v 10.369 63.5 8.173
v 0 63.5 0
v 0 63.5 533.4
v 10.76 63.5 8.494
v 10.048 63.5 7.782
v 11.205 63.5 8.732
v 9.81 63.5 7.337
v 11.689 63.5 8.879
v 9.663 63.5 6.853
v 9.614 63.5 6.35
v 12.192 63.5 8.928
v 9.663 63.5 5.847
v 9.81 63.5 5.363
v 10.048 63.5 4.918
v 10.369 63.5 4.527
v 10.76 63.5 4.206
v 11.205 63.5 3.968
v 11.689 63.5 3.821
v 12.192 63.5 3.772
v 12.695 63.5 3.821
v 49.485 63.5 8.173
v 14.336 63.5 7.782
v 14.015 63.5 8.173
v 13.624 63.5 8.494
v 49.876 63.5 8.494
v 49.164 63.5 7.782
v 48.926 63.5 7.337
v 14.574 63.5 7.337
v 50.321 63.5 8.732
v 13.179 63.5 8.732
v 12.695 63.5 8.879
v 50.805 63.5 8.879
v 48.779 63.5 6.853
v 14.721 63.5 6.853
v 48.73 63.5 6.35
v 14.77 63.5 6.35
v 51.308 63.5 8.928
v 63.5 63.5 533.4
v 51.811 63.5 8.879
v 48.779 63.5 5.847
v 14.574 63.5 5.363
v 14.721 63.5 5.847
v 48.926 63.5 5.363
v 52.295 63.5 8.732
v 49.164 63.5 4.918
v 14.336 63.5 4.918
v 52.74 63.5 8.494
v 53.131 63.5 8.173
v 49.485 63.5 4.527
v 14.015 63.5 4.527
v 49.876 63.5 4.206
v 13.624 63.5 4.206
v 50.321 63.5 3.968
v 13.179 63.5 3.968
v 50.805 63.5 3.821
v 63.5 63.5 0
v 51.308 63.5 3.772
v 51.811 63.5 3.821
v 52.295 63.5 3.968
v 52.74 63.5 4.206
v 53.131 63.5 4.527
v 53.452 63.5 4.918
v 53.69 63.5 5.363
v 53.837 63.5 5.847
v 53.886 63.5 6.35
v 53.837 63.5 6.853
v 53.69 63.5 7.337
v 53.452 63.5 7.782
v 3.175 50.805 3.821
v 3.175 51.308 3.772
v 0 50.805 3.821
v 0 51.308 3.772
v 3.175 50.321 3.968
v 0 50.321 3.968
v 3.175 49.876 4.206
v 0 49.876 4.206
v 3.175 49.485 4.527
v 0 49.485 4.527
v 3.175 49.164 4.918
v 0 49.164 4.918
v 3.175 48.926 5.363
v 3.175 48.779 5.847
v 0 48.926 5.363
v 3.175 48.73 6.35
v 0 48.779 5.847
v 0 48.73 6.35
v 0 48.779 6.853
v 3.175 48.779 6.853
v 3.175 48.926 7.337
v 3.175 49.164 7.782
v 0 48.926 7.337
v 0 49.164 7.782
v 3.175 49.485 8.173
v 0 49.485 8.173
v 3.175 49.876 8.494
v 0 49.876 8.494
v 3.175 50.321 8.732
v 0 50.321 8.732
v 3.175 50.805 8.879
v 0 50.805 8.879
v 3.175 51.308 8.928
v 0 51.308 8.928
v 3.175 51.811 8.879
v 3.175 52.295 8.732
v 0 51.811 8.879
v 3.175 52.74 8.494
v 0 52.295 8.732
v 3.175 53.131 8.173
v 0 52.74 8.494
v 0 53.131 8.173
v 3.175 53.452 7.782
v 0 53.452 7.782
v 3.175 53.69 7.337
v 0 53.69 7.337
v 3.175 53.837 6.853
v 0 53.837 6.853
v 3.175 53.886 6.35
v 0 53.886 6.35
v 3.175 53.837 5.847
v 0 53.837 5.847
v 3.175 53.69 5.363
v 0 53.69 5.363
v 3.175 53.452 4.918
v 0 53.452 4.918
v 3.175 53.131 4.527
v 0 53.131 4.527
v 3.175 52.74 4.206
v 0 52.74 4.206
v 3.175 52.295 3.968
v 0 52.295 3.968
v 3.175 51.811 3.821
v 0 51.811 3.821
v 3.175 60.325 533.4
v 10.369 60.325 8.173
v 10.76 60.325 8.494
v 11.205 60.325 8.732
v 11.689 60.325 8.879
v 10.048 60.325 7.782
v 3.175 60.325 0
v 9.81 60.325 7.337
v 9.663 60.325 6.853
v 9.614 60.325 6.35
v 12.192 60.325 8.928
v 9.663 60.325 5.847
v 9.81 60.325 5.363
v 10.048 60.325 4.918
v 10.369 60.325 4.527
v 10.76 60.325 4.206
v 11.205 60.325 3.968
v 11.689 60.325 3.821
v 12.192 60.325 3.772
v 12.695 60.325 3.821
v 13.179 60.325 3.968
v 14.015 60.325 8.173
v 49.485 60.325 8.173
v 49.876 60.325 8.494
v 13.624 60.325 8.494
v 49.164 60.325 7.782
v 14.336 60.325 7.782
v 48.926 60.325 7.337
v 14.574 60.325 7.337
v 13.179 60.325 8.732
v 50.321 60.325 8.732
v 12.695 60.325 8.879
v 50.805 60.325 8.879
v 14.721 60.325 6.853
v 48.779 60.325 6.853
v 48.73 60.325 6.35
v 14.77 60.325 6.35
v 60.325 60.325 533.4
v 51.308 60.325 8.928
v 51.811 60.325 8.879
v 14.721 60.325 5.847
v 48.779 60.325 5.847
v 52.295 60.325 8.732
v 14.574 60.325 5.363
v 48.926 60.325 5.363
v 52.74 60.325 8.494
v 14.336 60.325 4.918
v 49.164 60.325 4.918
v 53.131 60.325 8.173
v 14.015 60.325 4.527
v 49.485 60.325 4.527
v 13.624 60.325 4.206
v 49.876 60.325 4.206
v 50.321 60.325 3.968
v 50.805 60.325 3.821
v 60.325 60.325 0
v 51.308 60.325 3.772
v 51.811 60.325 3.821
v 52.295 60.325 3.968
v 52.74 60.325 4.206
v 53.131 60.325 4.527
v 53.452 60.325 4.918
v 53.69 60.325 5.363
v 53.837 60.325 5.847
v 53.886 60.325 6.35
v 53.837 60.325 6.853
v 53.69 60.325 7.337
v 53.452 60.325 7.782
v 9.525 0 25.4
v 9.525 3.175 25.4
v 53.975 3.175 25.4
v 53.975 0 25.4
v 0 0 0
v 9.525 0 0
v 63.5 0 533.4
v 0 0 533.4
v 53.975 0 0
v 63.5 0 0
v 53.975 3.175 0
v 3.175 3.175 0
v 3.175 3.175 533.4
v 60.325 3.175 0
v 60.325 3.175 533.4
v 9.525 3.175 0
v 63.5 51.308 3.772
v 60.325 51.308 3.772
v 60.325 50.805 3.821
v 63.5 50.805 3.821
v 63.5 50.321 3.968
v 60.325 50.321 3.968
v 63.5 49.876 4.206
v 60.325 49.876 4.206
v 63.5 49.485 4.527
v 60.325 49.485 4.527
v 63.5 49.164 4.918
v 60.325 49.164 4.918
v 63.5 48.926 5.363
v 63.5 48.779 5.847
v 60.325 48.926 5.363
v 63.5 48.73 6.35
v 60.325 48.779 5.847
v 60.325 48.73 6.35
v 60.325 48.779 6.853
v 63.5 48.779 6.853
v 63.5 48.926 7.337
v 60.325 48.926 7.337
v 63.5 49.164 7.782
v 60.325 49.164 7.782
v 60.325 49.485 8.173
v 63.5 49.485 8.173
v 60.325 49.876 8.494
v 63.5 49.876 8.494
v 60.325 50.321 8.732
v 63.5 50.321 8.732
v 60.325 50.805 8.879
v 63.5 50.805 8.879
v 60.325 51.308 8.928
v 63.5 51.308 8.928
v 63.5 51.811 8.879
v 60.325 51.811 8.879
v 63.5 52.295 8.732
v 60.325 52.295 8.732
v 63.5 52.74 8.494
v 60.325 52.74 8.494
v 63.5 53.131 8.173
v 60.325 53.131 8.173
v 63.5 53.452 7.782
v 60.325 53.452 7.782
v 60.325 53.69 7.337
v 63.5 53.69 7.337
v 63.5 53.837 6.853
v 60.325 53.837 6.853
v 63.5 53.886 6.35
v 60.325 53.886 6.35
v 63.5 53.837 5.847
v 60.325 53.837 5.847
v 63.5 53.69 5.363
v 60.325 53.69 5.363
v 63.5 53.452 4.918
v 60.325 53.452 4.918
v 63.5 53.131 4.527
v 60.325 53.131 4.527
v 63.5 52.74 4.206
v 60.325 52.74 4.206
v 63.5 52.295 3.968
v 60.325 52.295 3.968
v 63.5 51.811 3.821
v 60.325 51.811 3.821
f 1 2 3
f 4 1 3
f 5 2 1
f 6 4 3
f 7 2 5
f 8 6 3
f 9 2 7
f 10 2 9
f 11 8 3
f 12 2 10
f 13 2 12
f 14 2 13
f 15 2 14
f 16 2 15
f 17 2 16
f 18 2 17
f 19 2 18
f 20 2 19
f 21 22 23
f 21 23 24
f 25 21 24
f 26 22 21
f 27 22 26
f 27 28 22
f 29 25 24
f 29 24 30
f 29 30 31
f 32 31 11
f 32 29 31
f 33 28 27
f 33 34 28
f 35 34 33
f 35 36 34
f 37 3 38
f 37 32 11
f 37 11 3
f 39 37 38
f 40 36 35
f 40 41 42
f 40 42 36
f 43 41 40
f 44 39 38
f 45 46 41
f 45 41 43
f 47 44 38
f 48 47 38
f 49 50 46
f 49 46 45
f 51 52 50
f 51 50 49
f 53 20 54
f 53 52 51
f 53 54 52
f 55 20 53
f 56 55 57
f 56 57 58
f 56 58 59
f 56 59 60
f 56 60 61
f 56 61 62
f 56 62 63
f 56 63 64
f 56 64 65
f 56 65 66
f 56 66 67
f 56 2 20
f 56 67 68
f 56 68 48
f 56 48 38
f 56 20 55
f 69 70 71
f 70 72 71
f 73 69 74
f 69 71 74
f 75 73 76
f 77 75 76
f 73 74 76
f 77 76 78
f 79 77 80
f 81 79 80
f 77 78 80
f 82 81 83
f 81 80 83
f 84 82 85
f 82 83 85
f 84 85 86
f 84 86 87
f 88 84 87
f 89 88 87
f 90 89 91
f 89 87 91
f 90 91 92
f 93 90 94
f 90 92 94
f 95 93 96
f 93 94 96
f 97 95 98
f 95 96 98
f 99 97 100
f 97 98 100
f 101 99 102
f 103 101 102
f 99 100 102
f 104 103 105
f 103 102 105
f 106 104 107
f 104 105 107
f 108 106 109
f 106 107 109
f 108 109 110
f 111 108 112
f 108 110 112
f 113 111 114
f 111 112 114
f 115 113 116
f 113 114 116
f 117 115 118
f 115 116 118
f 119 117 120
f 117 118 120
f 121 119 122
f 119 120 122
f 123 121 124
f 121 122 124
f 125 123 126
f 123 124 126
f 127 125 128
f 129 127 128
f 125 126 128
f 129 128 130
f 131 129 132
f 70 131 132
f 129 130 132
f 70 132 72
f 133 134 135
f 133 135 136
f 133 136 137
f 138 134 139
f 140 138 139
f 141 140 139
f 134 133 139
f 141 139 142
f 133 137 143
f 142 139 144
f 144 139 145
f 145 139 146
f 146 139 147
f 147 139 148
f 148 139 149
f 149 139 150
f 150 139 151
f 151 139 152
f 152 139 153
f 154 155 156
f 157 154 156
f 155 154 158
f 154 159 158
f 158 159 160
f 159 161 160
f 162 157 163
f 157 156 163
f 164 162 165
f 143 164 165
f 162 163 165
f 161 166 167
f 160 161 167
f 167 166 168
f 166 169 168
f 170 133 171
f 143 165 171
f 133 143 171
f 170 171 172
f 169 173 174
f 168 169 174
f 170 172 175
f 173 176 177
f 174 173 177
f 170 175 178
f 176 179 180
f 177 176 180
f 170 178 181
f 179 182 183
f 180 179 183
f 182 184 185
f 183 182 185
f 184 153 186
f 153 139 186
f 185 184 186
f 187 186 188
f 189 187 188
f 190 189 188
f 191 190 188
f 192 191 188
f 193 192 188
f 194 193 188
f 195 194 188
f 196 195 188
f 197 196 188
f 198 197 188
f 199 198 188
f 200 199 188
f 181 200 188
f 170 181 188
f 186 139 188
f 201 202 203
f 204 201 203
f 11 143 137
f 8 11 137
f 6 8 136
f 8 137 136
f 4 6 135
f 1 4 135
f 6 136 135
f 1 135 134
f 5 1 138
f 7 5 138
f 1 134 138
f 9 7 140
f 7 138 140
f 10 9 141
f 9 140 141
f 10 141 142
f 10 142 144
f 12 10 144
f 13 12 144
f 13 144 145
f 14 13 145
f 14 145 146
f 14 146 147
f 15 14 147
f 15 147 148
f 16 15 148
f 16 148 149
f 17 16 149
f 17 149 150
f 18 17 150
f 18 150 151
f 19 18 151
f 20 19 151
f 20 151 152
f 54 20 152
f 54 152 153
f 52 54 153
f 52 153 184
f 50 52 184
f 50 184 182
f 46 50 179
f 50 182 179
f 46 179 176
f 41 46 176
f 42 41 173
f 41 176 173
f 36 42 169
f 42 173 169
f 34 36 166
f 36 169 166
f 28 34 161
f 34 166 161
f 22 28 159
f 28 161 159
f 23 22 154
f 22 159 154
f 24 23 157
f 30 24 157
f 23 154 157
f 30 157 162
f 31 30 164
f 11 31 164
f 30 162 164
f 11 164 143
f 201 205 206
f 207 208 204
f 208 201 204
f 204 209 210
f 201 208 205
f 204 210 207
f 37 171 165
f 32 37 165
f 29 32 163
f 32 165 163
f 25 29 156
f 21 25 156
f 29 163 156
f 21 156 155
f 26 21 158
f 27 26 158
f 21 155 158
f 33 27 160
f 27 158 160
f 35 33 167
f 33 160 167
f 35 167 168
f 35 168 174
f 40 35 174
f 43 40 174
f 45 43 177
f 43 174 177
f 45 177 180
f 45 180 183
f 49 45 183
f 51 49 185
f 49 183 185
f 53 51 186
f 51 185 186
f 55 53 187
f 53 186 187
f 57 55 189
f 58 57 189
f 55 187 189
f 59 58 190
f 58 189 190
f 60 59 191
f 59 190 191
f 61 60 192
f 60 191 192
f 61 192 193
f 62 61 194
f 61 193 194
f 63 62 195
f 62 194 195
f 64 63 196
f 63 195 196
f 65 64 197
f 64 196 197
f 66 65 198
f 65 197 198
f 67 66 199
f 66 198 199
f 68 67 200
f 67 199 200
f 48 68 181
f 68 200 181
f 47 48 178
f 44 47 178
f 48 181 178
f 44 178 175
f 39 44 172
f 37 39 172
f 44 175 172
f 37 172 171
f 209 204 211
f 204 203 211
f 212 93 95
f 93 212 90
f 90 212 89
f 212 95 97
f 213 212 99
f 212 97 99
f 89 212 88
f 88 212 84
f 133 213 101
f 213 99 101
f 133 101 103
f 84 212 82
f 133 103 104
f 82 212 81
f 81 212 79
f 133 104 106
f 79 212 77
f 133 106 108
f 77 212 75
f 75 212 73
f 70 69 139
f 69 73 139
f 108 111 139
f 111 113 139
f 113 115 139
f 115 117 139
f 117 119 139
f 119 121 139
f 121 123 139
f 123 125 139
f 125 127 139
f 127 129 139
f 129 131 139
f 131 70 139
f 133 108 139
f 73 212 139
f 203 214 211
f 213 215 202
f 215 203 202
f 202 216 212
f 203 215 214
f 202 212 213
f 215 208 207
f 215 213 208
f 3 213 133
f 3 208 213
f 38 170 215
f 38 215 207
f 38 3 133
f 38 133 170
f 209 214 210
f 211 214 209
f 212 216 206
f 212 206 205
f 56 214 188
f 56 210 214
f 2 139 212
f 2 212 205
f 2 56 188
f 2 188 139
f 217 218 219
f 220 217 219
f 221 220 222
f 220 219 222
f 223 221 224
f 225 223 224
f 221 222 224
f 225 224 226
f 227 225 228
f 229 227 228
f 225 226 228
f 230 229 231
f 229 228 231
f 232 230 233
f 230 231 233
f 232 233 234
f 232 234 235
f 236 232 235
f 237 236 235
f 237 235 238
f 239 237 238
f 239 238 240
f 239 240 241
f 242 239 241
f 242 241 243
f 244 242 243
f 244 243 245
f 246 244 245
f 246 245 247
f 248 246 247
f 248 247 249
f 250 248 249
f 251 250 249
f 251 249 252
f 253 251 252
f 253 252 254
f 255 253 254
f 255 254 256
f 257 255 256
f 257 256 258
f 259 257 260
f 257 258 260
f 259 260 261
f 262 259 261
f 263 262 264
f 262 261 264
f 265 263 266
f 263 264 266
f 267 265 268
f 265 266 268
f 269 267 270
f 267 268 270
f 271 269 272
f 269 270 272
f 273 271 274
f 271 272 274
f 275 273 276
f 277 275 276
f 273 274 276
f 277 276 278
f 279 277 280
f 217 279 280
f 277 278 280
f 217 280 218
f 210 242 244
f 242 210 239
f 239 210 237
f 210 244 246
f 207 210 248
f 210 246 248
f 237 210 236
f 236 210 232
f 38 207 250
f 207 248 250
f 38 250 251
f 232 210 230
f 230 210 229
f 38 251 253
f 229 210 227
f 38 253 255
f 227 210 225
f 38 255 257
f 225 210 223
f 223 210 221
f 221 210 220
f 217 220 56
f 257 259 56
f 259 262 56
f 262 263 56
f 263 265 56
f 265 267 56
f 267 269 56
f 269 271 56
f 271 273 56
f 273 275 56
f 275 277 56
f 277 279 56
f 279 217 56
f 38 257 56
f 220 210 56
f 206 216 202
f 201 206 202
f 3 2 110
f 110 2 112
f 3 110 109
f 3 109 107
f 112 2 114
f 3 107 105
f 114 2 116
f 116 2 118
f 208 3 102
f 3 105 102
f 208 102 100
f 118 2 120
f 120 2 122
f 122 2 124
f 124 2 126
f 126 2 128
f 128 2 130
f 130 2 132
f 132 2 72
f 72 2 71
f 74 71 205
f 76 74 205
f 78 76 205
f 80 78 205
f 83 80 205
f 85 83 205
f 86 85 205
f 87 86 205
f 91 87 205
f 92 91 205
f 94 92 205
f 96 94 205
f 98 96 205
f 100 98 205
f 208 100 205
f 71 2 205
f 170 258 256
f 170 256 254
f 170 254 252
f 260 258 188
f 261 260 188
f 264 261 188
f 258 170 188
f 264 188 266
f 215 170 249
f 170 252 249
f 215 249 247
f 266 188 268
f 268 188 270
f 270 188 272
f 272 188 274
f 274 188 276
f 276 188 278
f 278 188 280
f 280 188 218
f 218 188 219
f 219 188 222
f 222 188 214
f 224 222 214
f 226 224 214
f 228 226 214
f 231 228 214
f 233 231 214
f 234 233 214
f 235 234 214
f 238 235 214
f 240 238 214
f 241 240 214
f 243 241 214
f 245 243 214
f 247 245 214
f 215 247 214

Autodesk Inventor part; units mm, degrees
ref_plane "YZ Plane" through (0, 0, 0) normal (1, 0, 0) x (0, 1, 0)
ref_plane "XZ Plane" through (0, 0, 0) normal (0, 1, 0) x (-1, 0, 0)
ref_plane "XY Plane" through (0, 0, 0) normal (0, 0, 1) x (1, 0, 0)
sketch "Sketch1" plane through (0, 0, 0) normal (0, 0, 1) x (1, 0, 0)
  line L0 (0, 0) -> (63.5, 0)
  line L1 (63.5, 0) -> (63.5, 63.5)
  line L2 (63.5, 63.5) -> (0, 63.5)
  line L3 (0, 63.5) -> (0, 0)
  line L4 (3.175, 60.325) -> (60.325, 60.325)
  line L5 (60.325, 60.325) -> (60.325, 3.175)
  line L6 (60.325, 3.175) -> (3.175, 3.175)
  line L7 (3.175, 3.175) -> (3.175, 60.325)
  dimension "d0" = 63.5
  dimension "d1" = 63.5
  dimension "d2" = 3.175
extrude "Extrusion1" add sketch "Sketch1" along normal blind 533.4
sketch "Sketch3" plane through (0, 63.5, 0) normal (0, 1, 0) x (1, 0, 0)
  line L0 (9.525, 0) -> (9.525, -25.4)
  line L1 (9.525, -25.4) -> (53.975, -25.4)
  line L2 (53.975, -25.4) -> (53.975, 0)
  line L3 (63.5, 0) -> (63.5, -533.4) projected
  line L4 (63.5, 0) -> (0, 0) projected
  line L5 (9.525, 0) -> (53.975, 0)
  line L6 (0, 0) -> (63.5, 0) projected
  line L7 (63.5, 0) -> (0, 0) projected
  line L8 (0, 0) -> (0, -533.4) projected
  line L9 (63.5, -533.4) -> (0, -533.4) projected
  line L10 (63.5, 0) -> (63.5, -533.4) projected
  dimension "d14" = 44.45
  dimension "d16" = 25.4
  dimension "d19" = 9.525
  dimension "d20" = 9.525
extrude "Extrusion2" cut sketch "Sketch3" against normal blind 63.5 contours L4 L2 L1 L0
sketch "Sketch5" plane through (0, 63.5, 533.4) normal (0, 1, 0) x (1, 0, 0)
  line L0 (53.975, 508) -> (9.525, 508) projected
  line L1 (53.975, 533.4) -> (53.975, 508) projected
  line L2 (9.525, 508) -> (9.525, 533.4) projected
  line L3 (53.975, 533.4) -> (9.525, 533.4)
  point P0 (0, 533.4)
extrude "Extrusion3" add sketch "Sketch5" against normal blind 3.175
sketch "Sketch6" plane through (0, 63.5, 0) normal (0, 1, 0) x (1, 0, 0)
  line L0 (0, 0) -> (0, -533.4) projected
  line L1 (63.5, 0) -> (63.5, -533.4) projected
  line L2 (63.5, 0) -> (0, 0) projected
  point P0 (12.192, -6.35)
  point P1 (51.308, -6.35)
  dimension "d23" = 12.192
  dimension "d24" = 12.192
  dimension "d25" = 6.35
hole "Hole2" at (12.192, 63.5, 6.35) at (51.308, 63.5, 6.35) direction (0, -1, 0) diameter 5.1562 depth 25.4 tip angle 118
sketch "Sketch7" plane through (63.5, 0, 0) normal (1, 0, 0) x (0, 0, -1)
  line L0 (0, 63.5) -> (-533.4, 63.5) projected
  line L1 (0, 0) -> (0, 63.5) projected
  point P0 (-6.35, 51.308)
  dimension "d33" = 12.192
  dimension "d34" = 6.35
hole "Hole3" at (63.5, 51.308, 6.35) direction (-1, 0, 0) diameter 5.1562 depth 76.2 tip angle 118
equation "\"d19\" = d20"
equation "\"d24\" = d23"
properties part number "TelescopeNewOuter" material "Aluminum 6061"
